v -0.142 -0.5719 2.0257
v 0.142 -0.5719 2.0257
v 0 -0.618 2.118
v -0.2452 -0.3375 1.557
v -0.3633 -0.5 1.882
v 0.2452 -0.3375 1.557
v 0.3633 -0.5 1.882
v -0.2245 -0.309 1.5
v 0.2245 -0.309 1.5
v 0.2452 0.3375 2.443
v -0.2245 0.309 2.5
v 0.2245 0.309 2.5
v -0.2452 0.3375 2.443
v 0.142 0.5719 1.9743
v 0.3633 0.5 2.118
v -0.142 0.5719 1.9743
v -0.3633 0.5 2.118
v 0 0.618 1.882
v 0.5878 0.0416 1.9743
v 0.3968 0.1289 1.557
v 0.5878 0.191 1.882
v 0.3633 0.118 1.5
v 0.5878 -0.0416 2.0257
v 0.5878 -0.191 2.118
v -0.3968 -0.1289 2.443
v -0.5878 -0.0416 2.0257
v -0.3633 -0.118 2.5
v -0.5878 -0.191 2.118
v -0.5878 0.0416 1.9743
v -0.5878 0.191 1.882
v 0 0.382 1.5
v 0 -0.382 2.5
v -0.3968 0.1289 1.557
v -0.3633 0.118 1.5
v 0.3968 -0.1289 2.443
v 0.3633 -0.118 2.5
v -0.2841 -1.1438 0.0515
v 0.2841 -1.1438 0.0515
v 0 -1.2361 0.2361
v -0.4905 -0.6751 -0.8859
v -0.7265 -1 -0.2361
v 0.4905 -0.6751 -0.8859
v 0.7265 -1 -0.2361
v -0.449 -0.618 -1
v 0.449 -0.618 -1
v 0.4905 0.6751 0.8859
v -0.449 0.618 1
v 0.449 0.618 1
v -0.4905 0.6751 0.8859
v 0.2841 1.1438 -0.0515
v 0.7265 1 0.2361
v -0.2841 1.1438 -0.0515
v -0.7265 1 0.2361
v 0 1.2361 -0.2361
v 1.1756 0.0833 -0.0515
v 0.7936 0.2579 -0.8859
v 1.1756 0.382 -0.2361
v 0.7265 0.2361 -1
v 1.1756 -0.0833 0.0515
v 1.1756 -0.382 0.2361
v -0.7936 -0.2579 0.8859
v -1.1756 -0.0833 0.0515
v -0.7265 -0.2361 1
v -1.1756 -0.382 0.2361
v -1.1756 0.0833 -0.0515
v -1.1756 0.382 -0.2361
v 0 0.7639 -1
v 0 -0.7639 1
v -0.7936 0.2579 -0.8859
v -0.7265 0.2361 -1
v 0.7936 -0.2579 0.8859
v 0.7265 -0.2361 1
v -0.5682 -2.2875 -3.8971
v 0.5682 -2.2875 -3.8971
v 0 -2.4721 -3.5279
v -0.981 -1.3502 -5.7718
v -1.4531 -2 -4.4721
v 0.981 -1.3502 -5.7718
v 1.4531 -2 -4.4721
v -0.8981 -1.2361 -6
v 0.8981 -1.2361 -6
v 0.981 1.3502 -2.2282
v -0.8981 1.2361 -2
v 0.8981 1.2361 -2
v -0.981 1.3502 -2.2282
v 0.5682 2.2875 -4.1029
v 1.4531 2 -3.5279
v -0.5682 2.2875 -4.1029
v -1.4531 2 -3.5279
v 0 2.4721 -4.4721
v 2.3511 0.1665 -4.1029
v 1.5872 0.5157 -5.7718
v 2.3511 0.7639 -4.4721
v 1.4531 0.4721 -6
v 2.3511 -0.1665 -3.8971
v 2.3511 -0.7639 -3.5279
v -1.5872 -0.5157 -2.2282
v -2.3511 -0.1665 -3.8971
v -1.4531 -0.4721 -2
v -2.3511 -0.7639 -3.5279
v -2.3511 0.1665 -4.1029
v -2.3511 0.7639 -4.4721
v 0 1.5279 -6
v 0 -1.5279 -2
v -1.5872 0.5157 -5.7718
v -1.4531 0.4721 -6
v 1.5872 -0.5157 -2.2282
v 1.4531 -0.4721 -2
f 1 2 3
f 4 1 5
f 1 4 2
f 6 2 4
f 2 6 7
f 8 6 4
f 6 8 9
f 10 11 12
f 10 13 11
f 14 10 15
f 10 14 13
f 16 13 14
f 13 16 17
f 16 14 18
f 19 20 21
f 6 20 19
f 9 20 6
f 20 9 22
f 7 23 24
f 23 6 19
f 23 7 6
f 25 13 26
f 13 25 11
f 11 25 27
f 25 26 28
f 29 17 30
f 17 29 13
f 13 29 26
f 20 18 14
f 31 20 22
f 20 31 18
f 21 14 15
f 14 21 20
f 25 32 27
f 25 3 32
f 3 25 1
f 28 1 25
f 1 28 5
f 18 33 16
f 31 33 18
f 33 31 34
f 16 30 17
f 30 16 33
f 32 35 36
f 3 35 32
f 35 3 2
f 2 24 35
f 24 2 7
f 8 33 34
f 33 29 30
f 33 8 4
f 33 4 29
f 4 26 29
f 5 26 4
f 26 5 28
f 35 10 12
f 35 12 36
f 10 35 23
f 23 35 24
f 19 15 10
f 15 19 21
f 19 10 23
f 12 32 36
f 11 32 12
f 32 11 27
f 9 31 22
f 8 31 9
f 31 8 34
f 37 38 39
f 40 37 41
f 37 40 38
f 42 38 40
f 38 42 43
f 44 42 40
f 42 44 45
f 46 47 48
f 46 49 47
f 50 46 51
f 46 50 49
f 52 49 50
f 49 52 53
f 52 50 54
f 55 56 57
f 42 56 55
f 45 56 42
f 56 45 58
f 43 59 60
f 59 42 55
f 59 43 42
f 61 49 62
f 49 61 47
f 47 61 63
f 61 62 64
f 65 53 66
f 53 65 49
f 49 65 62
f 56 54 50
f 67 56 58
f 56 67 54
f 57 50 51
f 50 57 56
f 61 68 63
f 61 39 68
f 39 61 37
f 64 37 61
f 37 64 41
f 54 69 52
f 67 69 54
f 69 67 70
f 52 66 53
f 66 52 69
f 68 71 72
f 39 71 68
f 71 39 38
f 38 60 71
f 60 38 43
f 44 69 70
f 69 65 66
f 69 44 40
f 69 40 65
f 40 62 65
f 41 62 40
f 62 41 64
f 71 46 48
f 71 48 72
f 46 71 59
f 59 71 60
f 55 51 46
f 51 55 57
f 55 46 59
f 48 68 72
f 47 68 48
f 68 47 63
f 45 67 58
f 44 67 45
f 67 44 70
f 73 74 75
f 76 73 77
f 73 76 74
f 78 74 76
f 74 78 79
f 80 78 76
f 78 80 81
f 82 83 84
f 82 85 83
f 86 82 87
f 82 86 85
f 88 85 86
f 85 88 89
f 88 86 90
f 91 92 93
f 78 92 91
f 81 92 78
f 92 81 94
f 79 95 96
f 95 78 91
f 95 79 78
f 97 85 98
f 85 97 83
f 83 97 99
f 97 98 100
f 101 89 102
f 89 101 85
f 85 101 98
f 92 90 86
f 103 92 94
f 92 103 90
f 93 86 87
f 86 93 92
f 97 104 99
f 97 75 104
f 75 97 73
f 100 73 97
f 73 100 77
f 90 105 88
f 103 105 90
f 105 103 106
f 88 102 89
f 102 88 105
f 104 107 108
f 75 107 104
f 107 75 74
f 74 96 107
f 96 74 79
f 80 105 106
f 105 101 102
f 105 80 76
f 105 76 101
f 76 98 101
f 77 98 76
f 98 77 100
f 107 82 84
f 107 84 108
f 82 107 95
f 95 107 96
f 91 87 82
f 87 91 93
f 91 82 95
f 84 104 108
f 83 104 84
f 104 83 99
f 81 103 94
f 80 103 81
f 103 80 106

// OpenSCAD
module dodecahedron(height)
{
	scale([height,height,height])
	{
		intersection()
		{
			cube([2,2,1], center=true);
			intersection_for(i=[0:4])
			{
				rotate([0,0,72*i])
					rotate([116.565,0,0])
					cube([2,2,1], center=true);
			}
		}
	}
}

translate([0,0,2])dodecahedron(1);
dodecahedron(2);
translate([0,0,-4])dodecahedron(4);
